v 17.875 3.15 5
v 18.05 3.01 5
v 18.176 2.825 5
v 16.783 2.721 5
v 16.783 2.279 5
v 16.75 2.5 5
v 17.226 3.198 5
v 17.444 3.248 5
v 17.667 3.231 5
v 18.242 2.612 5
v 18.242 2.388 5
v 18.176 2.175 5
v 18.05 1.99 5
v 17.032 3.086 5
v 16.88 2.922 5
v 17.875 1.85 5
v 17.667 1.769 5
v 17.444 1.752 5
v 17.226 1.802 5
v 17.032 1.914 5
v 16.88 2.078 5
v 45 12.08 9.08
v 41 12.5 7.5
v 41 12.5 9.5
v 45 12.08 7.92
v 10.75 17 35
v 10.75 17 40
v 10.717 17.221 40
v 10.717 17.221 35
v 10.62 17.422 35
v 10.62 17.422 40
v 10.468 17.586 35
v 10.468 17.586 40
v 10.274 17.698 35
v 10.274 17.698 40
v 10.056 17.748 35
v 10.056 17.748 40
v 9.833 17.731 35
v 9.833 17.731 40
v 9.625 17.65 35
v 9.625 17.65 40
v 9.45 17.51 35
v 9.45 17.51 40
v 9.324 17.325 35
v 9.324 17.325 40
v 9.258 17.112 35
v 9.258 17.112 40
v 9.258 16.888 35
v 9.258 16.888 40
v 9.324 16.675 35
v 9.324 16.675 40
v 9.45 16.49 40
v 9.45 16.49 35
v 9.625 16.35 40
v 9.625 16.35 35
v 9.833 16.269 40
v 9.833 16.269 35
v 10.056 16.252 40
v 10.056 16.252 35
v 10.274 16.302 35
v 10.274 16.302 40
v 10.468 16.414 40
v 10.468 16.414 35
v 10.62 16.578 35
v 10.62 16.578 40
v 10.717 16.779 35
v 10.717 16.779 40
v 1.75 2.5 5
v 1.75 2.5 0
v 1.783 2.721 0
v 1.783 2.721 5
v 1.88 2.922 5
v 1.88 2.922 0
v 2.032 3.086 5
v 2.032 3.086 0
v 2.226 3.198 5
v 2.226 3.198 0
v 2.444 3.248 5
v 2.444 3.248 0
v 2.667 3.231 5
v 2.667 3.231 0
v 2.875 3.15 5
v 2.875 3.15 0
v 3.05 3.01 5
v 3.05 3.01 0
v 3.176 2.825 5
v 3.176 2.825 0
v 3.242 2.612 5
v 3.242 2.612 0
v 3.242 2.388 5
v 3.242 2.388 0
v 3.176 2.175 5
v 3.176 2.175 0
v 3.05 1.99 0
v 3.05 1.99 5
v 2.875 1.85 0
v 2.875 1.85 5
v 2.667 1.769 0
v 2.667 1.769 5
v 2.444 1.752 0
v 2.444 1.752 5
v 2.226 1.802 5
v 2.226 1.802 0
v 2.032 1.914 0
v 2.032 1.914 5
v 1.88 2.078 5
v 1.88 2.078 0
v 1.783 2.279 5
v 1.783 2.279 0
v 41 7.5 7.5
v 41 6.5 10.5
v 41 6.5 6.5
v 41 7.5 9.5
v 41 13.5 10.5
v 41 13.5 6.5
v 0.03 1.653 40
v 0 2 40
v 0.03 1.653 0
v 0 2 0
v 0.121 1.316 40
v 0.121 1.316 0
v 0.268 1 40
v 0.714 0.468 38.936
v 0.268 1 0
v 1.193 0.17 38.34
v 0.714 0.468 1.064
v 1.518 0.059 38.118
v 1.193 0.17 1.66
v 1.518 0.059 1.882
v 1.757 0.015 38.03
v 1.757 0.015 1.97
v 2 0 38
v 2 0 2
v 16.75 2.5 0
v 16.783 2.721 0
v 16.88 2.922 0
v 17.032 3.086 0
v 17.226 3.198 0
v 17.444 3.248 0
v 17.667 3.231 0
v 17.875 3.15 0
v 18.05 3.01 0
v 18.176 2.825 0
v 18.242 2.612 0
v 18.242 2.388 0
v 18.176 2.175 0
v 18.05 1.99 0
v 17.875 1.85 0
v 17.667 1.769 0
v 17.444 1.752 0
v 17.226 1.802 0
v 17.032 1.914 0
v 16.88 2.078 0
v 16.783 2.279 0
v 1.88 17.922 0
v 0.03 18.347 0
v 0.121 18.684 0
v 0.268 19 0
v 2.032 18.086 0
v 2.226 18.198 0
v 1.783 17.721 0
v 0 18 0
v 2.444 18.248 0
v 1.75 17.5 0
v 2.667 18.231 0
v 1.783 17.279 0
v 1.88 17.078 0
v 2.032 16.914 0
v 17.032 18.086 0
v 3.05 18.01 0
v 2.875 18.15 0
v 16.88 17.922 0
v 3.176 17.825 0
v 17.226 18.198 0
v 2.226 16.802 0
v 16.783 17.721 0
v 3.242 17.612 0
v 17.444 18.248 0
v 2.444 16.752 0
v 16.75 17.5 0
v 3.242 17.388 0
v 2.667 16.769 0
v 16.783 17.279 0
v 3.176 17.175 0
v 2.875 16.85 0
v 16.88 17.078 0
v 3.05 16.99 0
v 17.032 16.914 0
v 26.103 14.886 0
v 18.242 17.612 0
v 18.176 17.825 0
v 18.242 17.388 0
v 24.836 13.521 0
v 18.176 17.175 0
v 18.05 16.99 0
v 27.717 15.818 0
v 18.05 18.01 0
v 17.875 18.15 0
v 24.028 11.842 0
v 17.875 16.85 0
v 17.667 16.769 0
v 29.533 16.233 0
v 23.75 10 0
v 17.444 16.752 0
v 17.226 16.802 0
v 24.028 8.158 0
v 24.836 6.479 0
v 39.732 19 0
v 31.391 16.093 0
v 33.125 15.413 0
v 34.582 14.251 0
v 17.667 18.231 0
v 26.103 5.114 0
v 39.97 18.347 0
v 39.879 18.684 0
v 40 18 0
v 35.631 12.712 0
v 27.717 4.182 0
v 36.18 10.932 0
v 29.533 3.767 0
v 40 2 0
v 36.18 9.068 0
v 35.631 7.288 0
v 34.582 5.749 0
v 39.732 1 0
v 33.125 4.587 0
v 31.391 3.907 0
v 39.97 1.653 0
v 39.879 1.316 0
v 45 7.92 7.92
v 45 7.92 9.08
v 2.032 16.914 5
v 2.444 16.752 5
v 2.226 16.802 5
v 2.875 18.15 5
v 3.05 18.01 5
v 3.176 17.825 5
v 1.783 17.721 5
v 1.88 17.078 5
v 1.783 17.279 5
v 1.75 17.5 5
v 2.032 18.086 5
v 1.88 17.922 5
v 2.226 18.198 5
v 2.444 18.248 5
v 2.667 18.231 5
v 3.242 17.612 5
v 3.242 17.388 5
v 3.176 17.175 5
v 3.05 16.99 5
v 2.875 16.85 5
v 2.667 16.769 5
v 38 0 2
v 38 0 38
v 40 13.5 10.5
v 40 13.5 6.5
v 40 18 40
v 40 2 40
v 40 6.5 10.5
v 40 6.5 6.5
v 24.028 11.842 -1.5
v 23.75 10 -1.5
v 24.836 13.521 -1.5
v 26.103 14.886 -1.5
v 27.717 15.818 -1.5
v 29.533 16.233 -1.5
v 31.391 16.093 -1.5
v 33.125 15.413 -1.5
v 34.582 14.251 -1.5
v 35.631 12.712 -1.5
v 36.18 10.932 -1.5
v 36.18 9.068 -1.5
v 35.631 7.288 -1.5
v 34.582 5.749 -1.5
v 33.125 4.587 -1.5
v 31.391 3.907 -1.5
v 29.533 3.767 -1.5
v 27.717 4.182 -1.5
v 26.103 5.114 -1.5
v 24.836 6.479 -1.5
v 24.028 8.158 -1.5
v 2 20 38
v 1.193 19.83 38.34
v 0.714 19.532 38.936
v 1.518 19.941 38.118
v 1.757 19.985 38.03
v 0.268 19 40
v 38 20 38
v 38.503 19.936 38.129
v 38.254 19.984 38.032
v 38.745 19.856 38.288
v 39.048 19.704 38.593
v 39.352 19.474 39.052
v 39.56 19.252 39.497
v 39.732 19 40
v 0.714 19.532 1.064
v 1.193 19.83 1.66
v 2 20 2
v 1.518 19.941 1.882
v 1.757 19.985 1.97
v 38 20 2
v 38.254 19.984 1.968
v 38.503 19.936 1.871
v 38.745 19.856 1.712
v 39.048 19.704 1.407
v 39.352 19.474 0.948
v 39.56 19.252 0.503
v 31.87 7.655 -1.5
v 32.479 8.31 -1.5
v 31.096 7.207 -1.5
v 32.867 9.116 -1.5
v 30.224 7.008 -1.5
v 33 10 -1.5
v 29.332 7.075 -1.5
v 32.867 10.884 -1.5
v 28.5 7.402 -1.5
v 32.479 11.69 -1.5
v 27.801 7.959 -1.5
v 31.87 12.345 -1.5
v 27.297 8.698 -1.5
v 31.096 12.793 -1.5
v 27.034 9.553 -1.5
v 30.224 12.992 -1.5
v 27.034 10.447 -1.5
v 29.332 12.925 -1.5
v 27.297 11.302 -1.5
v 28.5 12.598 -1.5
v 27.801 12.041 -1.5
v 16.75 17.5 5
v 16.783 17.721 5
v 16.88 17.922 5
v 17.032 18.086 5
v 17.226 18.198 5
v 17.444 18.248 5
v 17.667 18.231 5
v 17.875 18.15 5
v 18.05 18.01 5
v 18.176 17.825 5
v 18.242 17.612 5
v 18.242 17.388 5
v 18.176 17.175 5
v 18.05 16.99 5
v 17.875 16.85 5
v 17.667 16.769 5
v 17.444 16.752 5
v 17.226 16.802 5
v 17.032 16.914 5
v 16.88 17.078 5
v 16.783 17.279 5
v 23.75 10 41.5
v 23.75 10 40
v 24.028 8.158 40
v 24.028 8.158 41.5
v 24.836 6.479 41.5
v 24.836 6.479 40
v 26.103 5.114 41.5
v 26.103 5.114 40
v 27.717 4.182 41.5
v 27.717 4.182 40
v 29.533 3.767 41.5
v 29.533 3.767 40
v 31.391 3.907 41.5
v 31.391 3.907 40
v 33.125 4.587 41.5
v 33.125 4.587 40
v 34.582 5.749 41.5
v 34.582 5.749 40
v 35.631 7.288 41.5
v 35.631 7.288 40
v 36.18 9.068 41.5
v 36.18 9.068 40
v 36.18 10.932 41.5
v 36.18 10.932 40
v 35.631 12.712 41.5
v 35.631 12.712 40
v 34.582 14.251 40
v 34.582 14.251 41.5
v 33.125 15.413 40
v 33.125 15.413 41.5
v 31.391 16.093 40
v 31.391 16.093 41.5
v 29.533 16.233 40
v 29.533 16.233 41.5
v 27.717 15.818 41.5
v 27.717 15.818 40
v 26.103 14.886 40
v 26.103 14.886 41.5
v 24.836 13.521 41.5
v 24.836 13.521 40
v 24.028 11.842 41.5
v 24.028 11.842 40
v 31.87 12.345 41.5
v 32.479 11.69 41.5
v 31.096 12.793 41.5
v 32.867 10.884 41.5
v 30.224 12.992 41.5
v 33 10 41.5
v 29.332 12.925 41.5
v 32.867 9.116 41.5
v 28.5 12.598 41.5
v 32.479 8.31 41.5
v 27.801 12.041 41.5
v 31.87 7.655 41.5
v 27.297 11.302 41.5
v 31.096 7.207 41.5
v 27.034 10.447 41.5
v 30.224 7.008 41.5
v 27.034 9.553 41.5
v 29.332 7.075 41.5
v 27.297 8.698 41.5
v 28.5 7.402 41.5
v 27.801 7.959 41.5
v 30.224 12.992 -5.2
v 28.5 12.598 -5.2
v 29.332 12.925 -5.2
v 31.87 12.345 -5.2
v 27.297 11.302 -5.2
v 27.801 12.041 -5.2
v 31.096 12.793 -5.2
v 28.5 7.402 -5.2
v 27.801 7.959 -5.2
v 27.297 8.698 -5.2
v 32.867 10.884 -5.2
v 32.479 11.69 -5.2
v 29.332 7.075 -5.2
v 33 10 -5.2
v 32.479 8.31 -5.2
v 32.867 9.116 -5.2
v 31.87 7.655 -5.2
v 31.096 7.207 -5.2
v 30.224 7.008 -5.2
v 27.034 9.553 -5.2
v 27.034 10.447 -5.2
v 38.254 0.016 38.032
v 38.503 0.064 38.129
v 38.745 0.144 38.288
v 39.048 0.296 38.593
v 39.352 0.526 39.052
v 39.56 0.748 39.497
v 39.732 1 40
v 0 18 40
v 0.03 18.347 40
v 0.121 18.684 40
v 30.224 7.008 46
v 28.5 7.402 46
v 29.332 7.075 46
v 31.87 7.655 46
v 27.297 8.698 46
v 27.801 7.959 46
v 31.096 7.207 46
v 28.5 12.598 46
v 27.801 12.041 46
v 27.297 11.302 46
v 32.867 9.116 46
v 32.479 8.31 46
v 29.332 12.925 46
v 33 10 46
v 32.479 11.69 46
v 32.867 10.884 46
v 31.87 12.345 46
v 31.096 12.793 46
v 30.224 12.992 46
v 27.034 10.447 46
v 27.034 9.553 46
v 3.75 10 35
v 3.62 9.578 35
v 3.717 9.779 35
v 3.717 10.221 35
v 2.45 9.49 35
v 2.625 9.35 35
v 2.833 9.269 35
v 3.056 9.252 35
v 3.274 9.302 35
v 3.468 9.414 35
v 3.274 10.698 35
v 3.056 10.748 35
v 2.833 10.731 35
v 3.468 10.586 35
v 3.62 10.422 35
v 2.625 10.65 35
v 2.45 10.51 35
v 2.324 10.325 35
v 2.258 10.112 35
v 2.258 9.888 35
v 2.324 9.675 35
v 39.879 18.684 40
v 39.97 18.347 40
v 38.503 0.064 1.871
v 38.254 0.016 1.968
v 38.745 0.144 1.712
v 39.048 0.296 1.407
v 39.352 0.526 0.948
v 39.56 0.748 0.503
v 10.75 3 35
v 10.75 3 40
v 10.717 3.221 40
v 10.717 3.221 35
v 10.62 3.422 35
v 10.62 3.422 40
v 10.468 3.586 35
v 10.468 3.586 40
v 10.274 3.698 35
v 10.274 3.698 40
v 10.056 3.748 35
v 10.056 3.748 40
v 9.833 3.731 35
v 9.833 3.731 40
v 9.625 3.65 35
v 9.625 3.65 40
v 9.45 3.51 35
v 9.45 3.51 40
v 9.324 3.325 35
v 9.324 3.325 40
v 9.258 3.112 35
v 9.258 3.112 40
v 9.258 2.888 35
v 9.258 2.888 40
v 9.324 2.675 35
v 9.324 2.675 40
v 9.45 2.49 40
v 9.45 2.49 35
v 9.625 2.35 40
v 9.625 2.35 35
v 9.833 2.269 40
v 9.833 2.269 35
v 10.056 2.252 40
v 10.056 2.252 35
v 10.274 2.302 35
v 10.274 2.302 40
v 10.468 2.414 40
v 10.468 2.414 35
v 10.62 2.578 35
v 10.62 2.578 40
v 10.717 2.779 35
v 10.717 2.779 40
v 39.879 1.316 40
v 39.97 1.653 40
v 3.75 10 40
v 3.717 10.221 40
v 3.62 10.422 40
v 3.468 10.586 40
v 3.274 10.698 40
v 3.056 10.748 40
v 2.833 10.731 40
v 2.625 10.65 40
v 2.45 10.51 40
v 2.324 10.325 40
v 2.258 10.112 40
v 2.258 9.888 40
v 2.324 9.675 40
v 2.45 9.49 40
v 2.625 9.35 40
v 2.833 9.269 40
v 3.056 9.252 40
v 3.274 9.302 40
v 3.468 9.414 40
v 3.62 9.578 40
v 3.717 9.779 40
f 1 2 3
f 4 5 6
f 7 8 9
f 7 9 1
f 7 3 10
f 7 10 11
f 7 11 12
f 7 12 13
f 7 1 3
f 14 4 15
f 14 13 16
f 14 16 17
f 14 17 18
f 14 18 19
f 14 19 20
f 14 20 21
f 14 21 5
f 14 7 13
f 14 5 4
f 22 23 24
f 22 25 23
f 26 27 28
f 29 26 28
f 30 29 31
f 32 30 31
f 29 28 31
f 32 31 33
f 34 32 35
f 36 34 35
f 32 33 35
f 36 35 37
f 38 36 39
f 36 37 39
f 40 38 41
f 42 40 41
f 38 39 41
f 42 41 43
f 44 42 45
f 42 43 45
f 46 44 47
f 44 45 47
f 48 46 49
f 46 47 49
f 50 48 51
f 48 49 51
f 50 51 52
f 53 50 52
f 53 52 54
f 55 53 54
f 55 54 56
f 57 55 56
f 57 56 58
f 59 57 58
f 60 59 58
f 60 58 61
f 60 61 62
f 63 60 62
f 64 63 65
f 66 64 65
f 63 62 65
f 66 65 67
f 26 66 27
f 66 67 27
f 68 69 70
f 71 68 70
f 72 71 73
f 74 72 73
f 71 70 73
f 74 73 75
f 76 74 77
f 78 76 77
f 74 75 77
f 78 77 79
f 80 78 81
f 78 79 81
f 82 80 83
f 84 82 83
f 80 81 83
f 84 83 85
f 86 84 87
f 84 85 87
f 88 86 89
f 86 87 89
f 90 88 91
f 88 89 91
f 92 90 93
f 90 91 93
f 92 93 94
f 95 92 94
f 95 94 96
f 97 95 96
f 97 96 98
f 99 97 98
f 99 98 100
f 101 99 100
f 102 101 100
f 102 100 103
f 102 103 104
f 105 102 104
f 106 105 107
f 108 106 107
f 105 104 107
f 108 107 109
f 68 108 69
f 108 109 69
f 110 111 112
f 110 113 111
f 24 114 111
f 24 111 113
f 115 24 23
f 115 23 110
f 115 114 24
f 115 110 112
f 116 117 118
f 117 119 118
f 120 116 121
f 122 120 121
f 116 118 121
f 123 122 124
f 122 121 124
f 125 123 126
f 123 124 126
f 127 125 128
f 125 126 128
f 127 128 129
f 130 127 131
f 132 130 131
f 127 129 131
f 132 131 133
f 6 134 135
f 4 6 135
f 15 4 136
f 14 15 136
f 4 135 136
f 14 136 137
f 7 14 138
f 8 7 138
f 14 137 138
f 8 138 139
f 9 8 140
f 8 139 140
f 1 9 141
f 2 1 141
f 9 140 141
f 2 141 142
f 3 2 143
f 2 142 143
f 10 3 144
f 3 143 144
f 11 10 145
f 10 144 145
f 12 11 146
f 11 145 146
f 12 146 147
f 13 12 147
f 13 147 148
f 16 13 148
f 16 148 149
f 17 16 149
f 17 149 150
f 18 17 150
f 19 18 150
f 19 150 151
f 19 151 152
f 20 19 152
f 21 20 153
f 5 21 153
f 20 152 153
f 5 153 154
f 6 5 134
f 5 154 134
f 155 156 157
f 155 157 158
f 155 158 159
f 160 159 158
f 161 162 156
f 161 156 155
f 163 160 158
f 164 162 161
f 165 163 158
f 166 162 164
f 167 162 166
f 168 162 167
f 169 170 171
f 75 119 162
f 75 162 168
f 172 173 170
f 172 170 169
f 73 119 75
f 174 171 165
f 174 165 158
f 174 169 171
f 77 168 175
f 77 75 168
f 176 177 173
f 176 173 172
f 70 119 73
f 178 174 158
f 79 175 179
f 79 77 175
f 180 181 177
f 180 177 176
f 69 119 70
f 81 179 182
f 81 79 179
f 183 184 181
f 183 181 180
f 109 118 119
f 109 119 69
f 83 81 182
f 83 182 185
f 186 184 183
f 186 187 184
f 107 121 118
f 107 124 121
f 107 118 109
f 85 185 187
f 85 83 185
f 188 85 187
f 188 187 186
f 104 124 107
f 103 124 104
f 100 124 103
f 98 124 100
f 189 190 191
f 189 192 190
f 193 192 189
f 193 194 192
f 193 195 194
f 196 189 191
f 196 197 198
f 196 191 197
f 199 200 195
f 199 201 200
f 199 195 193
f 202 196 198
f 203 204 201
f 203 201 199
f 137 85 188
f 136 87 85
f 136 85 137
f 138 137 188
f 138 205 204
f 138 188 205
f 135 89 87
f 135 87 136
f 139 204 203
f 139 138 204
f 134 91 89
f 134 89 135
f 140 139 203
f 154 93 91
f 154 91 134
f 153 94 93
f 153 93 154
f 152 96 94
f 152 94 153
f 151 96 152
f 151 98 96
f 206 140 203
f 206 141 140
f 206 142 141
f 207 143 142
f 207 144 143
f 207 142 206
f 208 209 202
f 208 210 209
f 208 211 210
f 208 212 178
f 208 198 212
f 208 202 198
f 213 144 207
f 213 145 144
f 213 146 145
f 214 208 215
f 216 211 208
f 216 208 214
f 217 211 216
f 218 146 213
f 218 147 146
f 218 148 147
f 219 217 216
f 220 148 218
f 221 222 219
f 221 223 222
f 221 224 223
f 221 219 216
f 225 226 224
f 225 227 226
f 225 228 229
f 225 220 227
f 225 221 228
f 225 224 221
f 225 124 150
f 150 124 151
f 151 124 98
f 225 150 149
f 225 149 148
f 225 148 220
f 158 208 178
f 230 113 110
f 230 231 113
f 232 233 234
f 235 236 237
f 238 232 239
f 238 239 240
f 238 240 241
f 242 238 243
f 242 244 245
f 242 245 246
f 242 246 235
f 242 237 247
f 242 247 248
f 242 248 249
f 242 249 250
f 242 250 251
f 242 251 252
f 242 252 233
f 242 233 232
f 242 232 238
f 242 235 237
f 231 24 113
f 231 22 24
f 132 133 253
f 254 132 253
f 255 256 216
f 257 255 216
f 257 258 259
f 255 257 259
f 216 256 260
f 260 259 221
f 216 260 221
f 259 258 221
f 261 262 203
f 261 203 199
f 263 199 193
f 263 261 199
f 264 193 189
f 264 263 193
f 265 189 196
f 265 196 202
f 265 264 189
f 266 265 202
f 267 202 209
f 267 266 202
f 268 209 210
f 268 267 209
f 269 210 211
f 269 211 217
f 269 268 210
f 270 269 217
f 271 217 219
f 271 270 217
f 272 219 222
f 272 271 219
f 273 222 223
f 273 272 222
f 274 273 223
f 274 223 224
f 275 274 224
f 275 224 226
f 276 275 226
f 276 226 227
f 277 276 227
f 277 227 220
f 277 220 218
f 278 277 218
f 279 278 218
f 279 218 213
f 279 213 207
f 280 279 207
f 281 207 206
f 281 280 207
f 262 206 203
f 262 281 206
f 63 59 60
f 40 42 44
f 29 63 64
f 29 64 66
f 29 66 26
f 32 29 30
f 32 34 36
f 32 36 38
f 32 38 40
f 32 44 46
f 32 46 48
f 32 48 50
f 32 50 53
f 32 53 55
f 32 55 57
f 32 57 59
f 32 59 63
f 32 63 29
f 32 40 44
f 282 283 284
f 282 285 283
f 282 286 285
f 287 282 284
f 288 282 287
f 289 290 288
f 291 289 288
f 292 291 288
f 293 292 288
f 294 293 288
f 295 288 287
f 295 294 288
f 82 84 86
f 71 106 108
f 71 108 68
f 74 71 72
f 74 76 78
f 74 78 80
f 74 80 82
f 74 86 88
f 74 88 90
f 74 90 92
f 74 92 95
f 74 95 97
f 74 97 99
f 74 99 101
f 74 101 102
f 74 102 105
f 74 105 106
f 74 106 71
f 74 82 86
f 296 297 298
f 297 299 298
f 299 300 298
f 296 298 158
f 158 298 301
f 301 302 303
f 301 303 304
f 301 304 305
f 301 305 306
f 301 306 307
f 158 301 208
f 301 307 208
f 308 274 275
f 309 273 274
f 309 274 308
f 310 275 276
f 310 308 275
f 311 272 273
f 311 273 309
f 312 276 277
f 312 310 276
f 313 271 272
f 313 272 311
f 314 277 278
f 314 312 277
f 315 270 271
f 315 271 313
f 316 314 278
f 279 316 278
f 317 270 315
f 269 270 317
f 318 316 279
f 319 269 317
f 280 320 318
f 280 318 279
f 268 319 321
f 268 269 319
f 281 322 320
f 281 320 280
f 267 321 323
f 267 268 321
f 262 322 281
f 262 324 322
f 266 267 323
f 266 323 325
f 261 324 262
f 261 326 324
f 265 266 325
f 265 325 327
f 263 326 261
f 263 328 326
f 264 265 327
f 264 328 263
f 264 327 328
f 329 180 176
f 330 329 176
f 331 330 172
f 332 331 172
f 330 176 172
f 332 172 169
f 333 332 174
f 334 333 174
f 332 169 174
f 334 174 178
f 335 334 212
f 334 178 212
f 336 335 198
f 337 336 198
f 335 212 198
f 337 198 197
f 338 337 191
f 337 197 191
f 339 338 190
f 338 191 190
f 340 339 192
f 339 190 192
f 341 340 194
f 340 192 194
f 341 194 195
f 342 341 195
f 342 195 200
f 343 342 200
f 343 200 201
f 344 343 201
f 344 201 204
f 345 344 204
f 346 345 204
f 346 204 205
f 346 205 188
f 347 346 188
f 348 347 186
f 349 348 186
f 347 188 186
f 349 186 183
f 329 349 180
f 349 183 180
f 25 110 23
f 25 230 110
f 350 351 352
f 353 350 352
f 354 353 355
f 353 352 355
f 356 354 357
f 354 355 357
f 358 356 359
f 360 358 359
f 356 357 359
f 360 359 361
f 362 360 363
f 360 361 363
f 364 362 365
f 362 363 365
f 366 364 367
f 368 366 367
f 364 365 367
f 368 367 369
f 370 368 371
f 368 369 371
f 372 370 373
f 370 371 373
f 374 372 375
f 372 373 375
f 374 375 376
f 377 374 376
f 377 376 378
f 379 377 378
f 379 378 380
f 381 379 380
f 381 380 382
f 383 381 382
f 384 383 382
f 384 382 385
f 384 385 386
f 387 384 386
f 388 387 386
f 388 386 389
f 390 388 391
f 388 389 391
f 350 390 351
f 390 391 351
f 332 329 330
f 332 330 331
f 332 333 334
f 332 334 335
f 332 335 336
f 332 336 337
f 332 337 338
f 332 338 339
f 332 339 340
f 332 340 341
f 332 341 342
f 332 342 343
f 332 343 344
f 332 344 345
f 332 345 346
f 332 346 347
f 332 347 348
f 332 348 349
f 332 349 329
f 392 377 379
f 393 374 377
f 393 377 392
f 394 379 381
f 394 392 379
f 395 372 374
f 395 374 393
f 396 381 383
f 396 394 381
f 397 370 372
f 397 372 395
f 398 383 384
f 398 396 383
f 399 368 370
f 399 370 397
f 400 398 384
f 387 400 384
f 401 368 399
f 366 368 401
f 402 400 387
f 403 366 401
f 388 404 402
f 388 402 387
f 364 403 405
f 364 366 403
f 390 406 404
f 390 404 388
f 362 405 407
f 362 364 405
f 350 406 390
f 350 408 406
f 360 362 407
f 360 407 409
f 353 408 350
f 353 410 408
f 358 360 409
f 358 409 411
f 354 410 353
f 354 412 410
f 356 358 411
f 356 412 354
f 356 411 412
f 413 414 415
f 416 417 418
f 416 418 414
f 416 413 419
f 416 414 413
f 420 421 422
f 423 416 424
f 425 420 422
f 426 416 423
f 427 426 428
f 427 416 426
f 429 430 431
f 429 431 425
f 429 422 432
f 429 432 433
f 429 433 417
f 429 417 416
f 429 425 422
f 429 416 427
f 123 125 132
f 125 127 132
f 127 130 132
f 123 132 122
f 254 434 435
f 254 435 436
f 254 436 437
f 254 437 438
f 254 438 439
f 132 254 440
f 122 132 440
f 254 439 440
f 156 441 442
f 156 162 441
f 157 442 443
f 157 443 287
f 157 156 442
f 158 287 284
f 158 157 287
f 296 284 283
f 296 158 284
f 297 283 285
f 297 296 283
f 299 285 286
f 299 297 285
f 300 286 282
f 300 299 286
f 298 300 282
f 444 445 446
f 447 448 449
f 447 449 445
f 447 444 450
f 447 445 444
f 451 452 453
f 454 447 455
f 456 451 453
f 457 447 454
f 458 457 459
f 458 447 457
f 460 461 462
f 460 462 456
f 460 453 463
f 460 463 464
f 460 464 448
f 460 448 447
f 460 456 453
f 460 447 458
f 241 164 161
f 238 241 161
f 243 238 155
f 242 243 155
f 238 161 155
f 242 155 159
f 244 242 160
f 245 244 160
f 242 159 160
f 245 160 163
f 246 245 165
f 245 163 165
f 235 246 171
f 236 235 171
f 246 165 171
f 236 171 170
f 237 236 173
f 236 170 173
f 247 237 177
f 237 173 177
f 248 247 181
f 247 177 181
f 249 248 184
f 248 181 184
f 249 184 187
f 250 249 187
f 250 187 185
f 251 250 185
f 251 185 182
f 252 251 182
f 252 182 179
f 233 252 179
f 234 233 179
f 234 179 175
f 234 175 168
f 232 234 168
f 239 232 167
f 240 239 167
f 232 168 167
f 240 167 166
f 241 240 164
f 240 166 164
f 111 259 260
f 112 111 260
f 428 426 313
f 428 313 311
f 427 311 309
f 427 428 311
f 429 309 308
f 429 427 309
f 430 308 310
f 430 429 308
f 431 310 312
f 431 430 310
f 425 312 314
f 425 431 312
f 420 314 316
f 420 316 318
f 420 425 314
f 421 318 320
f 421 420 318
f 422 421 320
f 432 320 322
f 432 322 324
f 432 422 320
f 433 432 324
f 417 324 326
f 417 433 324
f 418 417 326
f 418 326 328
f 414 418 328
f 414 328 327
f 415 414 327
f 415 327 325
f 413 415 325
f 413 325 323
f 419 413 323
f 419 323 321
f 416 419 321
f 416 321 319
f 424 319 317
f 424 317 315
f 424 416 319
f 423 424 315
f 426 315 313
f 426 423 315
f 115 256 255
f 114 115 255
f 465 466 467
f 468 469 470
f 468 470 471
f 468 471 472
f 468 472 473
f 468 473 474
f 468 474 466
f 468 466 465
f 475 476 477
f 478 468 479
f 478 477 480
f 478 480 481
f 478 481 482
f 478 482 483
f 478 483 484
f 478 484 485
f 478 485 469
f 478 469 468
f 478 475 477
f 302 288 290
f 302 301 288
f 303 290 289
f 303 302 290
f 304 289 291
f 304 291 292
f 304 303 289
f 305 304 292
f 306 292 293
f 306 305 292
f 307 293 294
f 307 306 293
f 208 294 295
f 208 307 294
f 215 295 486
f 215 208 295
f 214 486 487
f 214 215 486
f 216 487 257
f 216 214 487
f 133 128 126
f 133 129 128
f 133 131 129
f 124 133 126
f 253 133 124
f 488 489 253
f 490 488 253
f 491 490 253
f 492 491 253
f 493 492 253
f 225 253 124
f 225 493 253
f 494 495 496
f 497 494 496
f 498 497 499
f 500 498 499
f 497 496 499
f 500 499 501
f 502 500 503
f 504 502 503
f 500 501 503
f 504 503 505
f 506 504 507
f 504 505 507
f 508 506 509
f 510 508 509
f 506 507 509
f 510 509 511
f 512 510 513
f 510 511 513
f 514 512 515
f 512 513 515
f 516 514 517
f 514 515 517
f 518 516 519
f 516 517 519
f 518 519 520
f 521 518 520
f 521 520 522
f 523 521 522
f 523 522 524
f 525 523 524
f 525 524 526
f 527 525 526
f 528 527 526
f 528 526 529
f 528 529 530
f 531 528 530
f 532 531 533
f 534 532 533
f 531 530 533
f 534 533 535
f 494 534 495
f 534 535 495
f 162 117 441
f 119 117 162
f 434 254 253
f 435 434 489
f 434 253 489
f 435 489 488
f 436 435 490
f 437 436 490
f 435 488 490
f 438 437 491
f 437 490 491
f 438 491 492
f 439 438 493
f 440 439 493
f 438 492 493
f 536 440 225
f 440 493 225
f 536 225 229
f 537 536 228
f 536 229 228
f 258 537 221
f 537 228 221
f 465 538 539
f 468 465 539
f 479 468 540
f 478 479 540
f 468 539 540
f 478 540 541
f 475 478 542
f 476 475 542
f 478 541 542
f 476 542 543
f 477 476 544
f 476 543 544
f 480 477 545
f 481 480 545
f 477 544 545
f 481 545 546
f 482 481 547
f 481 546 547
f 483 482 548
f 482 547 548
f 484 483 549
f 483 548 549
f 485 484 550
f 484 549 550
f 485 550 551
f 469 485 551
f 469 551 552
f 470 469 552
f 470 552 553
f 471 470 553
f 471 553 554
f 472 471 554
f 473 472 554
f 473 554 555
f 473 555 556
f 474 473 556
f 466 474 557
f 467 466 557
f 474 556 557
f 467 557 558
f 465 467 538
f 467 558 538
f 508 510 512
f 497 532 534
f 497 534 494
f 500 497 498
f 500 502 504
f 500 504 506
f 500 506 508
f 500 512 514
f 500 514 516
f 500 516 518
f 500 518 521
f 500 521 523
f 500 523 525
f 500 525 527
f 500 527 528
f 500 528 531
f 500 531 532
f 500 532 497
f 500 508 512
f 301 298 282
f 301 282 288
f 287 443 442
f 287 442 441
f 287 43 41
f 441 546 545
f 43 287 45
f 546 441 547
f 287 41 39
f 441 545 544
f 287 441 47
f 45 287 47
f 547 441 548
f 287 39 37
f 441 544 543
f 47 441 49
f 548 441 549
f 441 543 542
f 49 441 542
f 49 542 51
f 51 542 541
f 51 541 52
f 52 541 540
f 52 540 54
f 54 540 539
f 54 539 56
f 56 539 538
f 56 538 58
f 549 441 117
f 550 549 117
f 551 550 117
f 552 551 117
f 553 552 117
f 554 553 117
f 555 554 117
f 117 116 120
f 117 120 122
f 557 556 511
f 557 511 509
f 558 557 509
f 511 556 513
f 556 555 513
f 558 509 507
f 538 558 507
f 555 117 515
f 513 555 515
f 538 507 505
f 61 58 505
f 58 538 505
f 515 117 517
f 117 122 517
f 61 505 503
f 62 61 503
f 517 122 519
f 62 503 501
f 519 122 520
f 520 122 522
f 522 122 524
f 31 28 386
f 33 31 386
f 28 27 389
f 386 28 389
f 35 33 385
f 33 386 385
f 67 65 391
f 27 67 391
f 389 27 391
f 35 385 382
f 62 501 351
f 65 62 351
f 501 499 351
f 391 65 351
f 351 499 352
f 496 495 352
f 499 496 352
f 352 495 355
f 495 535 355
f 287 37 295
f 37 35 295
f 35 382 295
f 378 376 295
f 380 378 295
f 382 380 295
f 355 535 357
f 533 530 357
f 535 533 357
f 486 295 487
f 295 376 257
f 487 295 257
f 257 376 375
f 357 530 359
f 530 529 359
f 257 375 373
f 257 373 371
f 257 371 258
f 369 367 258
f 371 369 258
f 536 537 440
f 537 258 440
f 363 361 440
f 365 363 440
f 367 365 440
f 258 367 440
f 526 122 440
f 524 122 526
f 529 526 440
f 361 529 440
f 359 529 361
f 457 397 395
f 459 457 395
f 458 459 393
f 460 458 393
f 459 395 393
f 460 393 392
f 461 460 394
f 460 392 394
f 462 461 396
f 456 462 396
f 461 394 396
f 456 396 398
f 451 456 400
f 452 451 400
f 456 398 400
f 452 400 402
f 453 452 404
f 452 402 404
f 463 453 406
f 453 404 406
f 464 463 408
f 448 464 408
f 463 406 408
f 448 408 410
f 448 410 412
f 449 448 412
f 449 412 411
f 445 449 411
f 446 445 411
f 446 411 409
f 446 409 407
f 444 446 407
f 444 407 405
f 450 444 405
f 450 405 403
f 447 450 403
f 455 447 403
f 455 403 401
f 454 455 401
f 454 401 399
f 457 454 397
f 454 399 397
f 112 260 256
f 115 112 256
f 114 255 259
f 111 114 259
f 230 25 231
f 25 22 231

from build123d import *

# Parameters (mm, degrees)
SKETCH_1_W          = 40
SKETCH_1_H          = 40
EXTRUDE_1_DEPTH     = 20
SKETCH_2_R          = 6.25
EXTRUDE_2_DEPTH     = 1.5
SKETCH_3_R          = 3
EXTRUDE_776_DEPTH   = 4.5
EXTRUDE_START       = 1.5
SKETCH_4_R          = 6.25
EXTRUDE_4_DEPTH     = 1.5
EXTRUDE_START_2     = 3.7
SKETCH_5_R          = 3
EXTRUDE_5_DEPTH     = 3.7
SKETCH_7_R          = 0.75
CUT_EXTRUDE_1_DEPTH = 5
SKETCH_8_R          = 0.75
CUT_EXTRUDE_2_DEPTH = 5
EXTRUDE_6_DEPTH     = 1
EXTRUDE_1947_DEPTH  = 4
EXTRUDE_1947_TAPER  = 6
CUT_EXTRUDE_3_DEPTH = 65.156059729
FILLET_1_R          = 2


with BuildPart() as part:
    # Эскиз1 → Бобышка-Вытянуть1 (new body)
    with BuildSketch(Plane(origin=(0, 0, 0), x_dir=(1, 0, 0), z_dir=(0, 1, 0))):
        with Locations((20, -20)):
            Rectangle(SKETCH_1_W, SKETCH_1_H)
    extrude(amount=EXTRUDE_1_DEPTH)

    # Эскиз2 → Бобышка-Вытянуть2 (add)
    with BuildSketch(Plane.XY.offset(40)):
        with Locations(Location((30, 10, 0), (0, 0, 180))):
            Circle(SKETCH_2_R)
    extrude(amount=EXTRUDE_2_DEPTH)

    # Эскиз3 → Extrude 776 (add)
    with BuildSketch(Plane.XY.offset(41.5)):
        with Locations((30, 10)):
            Circle(SKETCH_3_R)
    extrude(amount=EXTRUDE_776_DEPTH)

    # Эскиз4 → Бобышка-Вытянуть4 (add)
    with BuildSketch(Plane(origin=(0, 0, 0), x_dir=(-1, 0, 0), z_dir=(0, 0, -1)).offset(EXTRUDE_START)):
        with Locations((-30, 10)):
            Circle(SKETCH_4_R)
    extrude(amount=-EXTRUDE_4_DEPTH)

    # Эскиз5 → Бобышка-Вытянуть5 (add)
    with BuildSketch(Plane(origin=(0, 0, -1.5), x_dir=(-1, 0, 0), z_dir=(0, 0, -1)).offset(EXTRUDE_START_2)):
        with Locations(Location((-30, 10, 0), (0, 0, 180))):
            Circle(SKETCH_5_R)
    extrude(amount=-EXTRUDE_5_DEPTH)

    # Эскиз7 → Вырез-Вытянуть1 (cut)
    with BuildSketch(Plane(origin=(0, 0, 0), x_dir=(-1, 0, 0), z_dir=(0, 0, -1))):
        with Locations((-17.5, 17.5)):
            Circle(SKETCH_7_R)
        with Locations((-2.5, 17.5)):
            Circle(SKETCH_7_R)
        with Locations((-2.5, 2.5)):
            Circle(SKETCH_7_R)
        with Locations((-17.5, 2.5)):
            Circle(SKETCH_7_R)
    extrude(amount=-CUT_EXTRUDE_1_DEPTH, mode=Mode.SUBTRACT)

    # Эскиз8 → Вырез-Вытянуть2 (cut)
    with BuildSketch(Plane.XY.offset(40)):
        with Locations((10, 17)):
            Circle(SKETCH_8_R)
        with Locations((3, 10)):
            Circle(SKETCH_8_R)
        with Locations((10, 3)):
            Circle(SKETCH_8_R)
    extrude(amount=-CUT_EXTRUDE_2_DEPTH, mode=Mode.SUBTRACT)

    # Эскиз9 → Бобышка-Вытянуть6 (add)
    with BuildSketch(Plane(origin=(40, 0, 0), x_dir=(0, 0, -1), z_dir=(1, 0, 0))):
        Polygon((-6.5, 10), (-6.5, 13.5), (-10.5, 13.5), (-10.5, 6.5), (-6.5, 6.5), align=None)
    extrude(amount=EXTRUDE_6_DEPTH)

    # Эскиз10 → Extrude 1947 (add)
    with BuildSketch(Plane(origin=(41, 0, 0), x_dir=(0, 0, -1), z_dir=(1, 0, 0))):
        Polygon((-7.5, 12.5), (-8.5, 12.5), (-9.5, 12.5), (-9.5, 7.5), (-7.5, 7.5), align=None)
    extrude(amount=EXTRUDE_1947_DEPTH, taper=EXTRUDE_1947_TAPER)

    # Эскиз11 → Вырез-Вытянуть3 (cut, through all)
    with BuildSketch(Plane(origin=(40, 0, 0), x_dir=(0, 0, -1), z_dir=(1, 0, 0))):
        Polygon((-40, 20), (-38, 20), (-40, 19), align=None)
        Polygon((0, 20), (-2, 20), (0, 19), align=None)
        Polygon((0, 0), (-2, 0), (0, 1), align=None)
        Polygon((-40, 0), (-38, 0), (-40, 1), align=None)
    extrude(amount=-CUT_EXTRUDE_3_DEPTH, mode=Mode.SUBTRACT)

    # Скругление1
    fillet_1_edges = [part.edges().sort_by_distance(p)[0] for p in [
        (0, 0, 20),
        (0, 20, 20),
        (40, 0, 20),
        (40, 20, 20),
    ]]
    fillet(fillet_1_edges, radius=FILLET_1_R)


solid = part.part
